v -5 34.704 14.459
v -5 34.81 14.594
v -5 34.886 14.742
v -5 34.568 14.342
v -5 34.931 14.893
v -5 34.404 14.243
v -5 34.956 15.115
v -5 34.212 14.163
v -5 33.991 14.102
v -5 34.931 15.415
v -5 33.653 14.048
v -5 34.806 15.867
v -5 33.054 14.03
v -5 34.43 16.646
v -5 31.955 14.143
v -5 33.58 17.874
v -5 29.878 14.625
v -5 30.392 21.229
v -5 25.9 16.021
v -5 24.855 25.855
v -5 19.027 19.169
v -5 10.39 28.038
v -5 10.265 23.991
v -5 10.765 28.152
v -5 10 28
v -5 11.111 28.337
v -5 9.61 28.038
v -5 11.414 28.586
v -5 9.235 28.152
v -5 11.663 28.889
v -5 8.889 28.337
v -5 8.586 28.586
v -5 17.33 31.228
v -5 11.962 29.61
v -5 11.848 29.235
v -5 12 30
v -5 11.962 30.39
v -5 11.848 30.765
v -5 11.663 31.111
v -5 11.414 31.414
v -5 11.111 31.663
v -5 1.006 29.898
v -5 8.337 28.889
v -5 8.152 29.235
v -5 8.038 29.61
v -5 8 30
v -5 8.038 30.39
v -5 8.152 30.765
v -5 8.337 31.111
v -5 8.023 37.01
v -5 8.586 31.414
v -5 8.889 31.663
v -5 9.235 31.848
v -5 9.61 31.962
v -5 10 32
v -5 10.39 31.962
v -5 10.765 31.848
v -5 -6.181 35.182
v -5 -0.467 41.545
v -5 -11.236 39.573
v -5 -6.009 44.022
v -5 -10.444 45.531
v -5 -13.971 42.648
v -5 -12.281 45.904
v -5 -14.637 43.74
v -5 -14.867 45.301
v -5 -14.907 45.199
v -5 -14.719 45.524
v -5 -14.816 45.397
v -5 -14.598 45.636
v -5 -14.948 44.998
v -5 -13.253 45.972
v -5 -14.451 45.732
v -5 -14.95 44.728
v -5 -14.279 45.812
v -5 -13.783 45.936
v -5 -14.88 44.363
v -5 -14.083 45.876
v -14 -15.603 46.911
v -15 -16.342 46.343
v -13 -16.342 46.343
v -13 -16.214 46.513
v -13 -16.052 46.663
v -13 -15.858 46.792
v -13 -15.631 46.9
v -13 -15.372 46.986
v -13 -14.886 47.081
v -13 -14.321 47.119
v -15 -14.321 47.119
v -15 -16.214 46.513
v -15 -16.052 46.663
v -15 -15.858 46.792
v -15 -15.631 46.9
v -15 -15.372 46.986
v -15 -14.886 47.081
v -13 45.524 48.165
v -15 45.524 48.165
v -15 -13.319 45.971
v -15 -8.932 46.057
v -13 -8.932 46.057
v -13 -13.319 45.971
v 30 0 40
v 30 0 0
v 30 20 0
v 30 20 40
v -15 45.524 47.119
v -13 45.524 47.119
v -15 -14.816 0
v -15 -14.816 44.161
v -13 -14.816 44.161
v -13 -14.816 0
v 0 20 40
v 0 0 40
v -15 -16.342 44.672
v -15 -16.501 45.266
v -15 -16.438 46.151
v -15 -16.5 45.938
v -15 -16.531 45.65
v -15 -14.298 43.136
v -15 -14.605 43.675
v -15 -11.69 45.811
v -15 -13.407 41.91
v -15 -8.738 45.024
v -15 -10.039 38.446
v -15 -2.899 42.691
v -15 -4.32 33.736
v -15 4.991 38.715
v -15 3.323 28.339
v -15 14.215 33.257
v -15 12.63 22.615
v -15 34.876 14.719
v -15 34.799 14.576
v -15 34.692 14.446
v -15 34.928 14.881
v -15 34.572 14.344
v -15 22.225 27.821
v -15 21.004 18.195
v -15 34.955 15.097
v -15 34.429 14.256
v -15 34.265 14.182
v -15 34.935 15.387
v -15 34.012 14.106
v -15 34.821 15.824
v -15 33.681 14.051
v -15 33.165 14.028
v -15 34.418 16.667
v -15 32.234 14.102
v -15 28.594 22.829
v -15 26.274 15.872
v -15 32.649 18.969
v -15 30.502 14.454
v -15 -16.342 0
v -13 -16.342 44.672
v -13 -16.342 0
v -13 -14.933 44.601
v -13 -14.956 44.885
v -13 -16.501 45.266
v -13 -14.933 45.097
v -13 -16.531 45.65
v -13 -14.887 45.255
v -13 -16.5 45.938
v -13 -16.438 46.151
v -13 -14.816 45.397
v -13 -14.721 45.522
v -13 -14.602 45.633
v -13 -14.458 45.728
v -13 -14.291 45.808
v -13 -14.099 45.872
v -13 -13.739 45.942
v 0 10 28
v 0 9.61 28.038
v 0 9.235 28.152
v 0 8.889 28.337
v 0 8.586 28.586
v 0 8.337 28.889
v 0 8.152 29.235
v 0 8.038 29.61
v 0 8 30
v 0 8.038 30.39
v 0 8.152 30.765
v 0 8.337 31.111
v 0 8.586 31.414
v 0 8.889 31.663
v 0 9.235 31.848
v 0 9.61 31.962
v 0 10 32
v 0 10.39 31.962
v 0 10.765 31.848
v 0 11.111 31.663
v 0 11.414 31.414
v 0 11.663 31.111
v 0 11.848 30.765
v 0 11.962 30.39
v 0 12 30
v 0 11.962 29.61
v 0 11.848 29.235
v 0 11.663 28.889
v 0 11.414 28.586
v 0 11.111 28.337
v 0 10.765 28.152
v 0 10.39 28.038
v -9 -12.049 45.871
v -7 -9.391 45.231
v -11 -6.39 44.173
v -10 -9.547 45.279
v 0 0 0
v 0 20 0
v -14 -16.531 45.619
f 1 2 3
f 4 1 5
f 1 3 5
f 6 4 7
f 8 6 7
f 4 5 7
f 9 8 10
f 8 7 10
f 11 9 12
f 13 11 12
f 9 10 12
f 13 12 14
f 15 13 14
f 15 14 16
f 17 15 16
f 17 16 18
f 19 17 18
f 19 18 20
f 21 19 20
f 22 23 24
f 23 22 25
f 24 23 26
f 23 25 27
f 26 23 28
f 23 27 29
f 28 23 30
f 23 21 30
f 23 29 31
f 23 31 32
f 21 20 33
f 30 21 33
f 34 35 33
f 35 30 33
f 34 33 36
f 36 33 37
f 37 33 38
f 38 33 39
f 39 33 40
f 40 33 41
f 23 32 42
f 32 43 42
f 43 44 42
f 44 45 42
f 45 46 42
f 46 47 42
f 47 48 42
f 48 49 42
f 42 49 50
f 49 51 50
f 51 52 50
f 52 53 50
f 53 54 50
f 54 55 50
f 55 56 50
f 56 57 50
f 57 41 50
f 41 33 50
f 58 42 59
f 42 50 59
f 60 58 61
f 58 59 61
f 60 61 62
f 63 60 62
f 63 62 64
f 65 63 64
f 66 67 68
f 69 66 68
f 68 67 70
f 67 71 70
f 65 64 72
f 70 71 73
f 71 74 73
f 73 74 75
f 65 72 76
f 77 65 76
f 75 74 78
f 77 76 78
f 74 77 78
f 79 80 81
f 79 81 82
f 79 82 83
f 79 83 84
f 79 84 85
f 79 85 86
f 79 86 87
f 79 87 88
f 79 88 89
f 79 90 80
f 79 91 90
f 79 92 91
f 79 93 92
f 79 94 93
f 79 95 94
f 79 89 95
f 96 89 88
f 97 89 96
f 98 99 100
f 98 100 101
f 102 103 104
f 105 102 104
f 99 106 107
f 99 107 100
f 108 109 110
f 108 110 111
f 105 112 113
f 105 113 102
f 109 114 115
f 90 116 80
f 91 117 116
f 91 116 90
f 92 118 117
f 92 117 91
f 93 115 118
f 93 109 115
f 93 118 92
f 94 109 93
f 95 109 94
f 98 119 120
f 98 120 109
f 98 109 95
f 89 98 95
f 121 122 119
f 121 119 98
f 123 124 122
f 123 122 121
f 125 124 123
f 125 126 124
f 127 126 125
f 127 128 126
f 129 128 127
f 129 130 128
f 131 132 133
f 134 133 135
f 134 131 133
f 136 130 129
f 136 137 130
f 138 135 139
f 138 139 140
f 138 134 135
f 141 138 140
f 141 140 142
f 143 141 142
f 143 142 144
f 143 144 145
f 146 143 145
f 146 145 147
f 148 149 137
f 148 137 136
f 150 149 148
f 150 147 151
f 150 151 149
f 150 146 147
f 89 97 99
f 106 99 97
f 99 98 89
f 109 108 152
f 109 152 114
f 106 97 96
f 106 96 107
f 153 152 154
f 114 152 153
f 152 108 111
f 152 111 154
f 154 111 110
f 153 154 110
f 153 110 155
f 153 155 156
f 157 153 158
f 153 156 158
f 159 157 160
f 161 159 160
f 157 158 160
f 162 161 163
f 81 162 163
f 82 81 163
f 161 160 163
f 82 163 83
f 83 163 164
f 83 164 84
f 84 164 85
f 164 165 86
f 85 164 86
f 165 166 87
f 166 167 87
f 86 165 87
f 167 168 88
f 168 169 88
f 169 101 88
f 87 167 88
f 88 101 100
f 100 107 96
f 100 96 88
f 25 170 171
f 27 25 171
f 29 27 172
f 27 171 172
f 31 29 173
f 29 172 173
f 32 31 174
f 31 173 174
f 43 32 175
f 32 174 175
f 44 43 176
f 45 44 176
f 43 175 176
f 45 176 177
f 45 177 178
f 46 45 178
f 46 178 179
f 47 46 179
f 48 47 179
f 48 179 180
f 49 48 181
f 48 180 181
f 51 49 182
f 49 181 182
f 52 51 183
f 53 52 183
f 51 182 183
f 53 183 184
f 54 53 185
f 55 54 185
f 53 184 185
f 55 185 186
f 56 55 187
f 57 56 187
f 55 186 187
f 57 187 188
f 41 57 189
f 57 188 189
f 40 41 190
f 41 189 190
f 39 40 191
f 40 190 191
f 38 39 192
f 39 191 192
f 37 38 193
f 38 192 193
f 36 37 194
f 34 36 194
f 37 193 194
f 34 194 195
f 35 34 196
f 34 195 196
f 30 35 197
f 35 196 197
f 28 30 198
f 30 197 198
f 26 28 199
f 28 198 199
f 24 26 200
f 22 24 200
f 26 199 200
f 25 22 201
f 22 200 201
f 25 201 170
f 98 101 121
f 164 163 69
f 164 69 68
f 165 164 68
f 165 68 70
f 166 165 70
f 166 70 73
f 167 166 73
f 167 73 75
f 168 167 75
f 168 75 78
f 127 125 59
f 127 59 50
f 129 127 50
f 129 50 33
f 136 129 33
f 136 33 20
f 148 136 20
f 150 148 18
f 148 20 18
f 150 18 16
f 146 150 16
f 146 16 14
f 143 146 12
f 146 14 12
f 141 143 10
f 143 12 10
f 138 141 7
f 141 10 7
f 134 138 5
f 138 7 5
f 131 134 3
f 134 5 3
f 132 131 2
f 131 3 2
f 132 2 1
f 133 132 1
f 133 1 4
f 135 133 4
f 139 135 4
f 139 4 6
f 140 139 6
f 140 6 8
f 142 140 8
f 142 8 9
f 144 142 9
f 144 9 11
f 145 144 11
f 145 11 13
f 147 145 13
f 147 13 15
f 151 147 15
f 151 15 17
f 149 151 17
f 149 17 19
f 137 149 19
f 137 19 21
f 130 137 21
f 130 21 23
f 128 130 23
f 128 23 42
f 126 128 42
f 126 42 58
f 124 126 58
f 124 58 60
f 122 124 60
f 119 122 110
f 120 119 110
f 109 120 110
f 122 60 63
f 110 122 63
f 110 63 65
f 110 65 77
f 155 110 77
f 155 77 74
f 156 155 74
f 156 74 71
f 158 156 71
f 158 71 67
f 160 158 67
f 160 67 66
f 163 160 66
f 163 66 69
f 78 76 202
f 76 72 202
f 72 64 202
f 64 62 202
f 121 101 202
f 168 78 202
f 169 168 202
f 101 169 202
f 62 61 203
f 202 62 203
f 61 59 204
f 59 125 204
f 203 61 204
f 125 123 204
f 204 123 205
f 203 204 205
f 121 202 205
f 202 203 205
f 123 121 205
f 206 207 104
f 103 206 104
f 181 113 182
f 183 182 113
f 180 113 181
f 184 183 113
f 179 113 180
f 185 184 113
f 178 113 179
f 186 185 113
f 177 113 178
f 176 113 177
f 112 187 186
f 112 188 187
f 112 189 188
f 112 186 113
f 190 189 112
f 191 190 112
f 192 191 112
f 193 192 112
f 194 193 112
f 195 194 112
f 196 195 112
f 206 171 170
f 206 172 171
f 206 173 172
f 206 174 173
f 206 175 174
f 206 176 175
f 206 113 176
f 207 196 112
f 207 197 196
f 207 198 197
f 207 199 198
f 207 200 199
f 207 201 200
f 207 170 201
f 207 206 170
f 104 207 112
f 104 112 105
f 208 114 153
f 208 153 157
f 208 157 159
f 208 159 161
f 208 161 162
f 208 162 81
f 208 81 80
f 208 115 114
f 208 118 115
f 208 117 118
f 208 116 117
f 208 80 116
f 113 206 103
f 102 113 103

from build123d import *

# Parameters (mm, degrees)
SKETCH_1_W      = 30
SKETCH_1_H      = 20
EXTRUDE_1_DEPTH = 40
SKETCH_2_R      = 2
EXTRUDE_2_DEPTH = 5
SKETCH_3_RX     = 29.20442212
SKETCH_3_RY     = 5
EXTRUDE_4_DEPTH = 10
EXTRUDE_5_DEPTH = 2


with BuildPart() as part:
    # 草图1 → 凸台-拉伸1 (new body)
    with BuildSketch(Plane.XY):
        with Locations((15, 10)):
            Rectangle(SKETCH_1_W, SKETCH_1_H)
    extrude(amount=EXTRUDE_1_DEPTH)

    # 草图2 → 凸台-拉伸2 (add)
    with BuildSketch(Plane.ZY):
        with Locations(Location((30, 10, 0), (0, 0, 180))):
            Circle(SKETCH_2_R)
    extrude(amount=EXTRUDE_2_DEPTH)

    # 草图3 → 凸台-拉伸4 (add)
    with BuildSketch(Plane.ZY.offset(5)):
        with Locations(Location((30, 10), (0, 0, -58.183129666))):
            Ellipse(SKETCH_3_RX, SKETCH_3_RY)
    extrude(amount=EXTRUDE_4_DEPTH)

    # 草图4 → 凸台-拉伸5 (add)
    with BuildSketch(Plane.ZY.offset(15)):
        with BuildLine():
            add(Edge.make_bspline(
                [(44.671665843, -16.341862431), (45.731147297, -16.721716463), (46.343386543, -16.341862431)],
                knots=[6.044161849, 6.044161849, 6.044161849, 6.283185307, 6.283185307, 6.283185307], degree=2, weights=[1, 0.99286697, 1]))
            Line((46.343386543, -16.341862431), (44.671665843, -16.341862431))
        make_face()
        with BuildLine():
            Line((44.671665843, -16.341862431), (46.343386543, -16.341862431))
            add(Edge.make_bspline(
                [(46.343386543, -16.341862431), (47.091960208, -15.877421892), (47.119167153, -14.320823946)],
                knots=[0, 0, 0, 0.29156576, 0.29156576, 0.29156576], degree=2, weights=[1, 0.989392482, 1]))
            add(Edge.make_bspline(
                [(47.119167153, -14.320823946), (47.153377166, -12.363557646), (46.056833567, -8.932081728)],
                knots=[0.29156576, 0.29156576, 0.29156576, 0.656688827, 0.656688827, 0.656688827], degree=2, weights=[1, 0.983381875, 1]))
            Line((46.056833567, -8.932081728), (45.971258289, -13.31870573))
            add(Edge.make_bspline(
                [(45.396747079, -14.816092575), (45.948727857, -14.473624944), (45.971258289, -13.31870573)],
                knots=[3.141592654, 3.141592654, 3.141592654, 3.399981292, 3.399981292, 3.399981292], degree=2, weights=[1, 0.991666016, 1]))
            add(Edge.make_bspline(
                [(44.16063068, -14.816092575), (44.945440411, -15.096098568), (45.396747079, -14.816092575)],
                knots=[2.929941094, 2.929941094, 2.929941094, 3.141592654, 3.141592654, 3.141592654], degree=2, weights=[1, 0.994405676, 1]))
            Line((44.16063068, -14.816092575), (42.129626505, -14.816092575))
            add(Edge.make_bspline(
                [(42.129626505, -14.816092575), (43.598799221, -15.957209438), (44.671665843, -16.341862431)],
                knots=[5.802147853, 5.802147853, 5.802147853, 6.044161849, 6.044161849, 6.044161849], degree=2, weights=[1, 0.992687583, 1]))
        make_face()
        with BuildLine():
            Line((0, -16.341862431), (44.671665843, -16.341862431))
            add(Edge.make_bspline(
                [(42.129626505, -14.816092575), (43.598799221, -15.957209438), (44.671665843, -16.341862431)],
                knots=[5.802147853, 5.802147853, 5.802147853, 6.044161849, 6.044161849, 6.044161849], degree=2, weights=[1, 0.992687583, 1]))
            Line((42.129626505, -14.816092575), (0, -14.816092575))
            Line((0, -14.816092575), (0, -16.341862431))
        make_face()
        with BuildLine():
            add(Edge.make_bspline(
                [(47.119167153, -14.320823946), (47.153377166, -12.363557646), (46.056833567, -8.932081728)],
                knots=[0.29156576, 0.29156576, 0.29156576, 0.656688827, 0.656688827, 0.656688827], degree=2, weights=[1, 0.983381875, 1]))
            Line((47.119167153, -14.320823946), (48.165155486, 45.523575701))
            Line((48.165155486, 45.523575701), (47.119167153, 45.523575701))
            Line((47.119167153, 45.523575701), (46.056833567, -8.932081728))
        make_face()
    extrude(amount=-EXTRUDE_5_DEPTH)


solid = part.part
